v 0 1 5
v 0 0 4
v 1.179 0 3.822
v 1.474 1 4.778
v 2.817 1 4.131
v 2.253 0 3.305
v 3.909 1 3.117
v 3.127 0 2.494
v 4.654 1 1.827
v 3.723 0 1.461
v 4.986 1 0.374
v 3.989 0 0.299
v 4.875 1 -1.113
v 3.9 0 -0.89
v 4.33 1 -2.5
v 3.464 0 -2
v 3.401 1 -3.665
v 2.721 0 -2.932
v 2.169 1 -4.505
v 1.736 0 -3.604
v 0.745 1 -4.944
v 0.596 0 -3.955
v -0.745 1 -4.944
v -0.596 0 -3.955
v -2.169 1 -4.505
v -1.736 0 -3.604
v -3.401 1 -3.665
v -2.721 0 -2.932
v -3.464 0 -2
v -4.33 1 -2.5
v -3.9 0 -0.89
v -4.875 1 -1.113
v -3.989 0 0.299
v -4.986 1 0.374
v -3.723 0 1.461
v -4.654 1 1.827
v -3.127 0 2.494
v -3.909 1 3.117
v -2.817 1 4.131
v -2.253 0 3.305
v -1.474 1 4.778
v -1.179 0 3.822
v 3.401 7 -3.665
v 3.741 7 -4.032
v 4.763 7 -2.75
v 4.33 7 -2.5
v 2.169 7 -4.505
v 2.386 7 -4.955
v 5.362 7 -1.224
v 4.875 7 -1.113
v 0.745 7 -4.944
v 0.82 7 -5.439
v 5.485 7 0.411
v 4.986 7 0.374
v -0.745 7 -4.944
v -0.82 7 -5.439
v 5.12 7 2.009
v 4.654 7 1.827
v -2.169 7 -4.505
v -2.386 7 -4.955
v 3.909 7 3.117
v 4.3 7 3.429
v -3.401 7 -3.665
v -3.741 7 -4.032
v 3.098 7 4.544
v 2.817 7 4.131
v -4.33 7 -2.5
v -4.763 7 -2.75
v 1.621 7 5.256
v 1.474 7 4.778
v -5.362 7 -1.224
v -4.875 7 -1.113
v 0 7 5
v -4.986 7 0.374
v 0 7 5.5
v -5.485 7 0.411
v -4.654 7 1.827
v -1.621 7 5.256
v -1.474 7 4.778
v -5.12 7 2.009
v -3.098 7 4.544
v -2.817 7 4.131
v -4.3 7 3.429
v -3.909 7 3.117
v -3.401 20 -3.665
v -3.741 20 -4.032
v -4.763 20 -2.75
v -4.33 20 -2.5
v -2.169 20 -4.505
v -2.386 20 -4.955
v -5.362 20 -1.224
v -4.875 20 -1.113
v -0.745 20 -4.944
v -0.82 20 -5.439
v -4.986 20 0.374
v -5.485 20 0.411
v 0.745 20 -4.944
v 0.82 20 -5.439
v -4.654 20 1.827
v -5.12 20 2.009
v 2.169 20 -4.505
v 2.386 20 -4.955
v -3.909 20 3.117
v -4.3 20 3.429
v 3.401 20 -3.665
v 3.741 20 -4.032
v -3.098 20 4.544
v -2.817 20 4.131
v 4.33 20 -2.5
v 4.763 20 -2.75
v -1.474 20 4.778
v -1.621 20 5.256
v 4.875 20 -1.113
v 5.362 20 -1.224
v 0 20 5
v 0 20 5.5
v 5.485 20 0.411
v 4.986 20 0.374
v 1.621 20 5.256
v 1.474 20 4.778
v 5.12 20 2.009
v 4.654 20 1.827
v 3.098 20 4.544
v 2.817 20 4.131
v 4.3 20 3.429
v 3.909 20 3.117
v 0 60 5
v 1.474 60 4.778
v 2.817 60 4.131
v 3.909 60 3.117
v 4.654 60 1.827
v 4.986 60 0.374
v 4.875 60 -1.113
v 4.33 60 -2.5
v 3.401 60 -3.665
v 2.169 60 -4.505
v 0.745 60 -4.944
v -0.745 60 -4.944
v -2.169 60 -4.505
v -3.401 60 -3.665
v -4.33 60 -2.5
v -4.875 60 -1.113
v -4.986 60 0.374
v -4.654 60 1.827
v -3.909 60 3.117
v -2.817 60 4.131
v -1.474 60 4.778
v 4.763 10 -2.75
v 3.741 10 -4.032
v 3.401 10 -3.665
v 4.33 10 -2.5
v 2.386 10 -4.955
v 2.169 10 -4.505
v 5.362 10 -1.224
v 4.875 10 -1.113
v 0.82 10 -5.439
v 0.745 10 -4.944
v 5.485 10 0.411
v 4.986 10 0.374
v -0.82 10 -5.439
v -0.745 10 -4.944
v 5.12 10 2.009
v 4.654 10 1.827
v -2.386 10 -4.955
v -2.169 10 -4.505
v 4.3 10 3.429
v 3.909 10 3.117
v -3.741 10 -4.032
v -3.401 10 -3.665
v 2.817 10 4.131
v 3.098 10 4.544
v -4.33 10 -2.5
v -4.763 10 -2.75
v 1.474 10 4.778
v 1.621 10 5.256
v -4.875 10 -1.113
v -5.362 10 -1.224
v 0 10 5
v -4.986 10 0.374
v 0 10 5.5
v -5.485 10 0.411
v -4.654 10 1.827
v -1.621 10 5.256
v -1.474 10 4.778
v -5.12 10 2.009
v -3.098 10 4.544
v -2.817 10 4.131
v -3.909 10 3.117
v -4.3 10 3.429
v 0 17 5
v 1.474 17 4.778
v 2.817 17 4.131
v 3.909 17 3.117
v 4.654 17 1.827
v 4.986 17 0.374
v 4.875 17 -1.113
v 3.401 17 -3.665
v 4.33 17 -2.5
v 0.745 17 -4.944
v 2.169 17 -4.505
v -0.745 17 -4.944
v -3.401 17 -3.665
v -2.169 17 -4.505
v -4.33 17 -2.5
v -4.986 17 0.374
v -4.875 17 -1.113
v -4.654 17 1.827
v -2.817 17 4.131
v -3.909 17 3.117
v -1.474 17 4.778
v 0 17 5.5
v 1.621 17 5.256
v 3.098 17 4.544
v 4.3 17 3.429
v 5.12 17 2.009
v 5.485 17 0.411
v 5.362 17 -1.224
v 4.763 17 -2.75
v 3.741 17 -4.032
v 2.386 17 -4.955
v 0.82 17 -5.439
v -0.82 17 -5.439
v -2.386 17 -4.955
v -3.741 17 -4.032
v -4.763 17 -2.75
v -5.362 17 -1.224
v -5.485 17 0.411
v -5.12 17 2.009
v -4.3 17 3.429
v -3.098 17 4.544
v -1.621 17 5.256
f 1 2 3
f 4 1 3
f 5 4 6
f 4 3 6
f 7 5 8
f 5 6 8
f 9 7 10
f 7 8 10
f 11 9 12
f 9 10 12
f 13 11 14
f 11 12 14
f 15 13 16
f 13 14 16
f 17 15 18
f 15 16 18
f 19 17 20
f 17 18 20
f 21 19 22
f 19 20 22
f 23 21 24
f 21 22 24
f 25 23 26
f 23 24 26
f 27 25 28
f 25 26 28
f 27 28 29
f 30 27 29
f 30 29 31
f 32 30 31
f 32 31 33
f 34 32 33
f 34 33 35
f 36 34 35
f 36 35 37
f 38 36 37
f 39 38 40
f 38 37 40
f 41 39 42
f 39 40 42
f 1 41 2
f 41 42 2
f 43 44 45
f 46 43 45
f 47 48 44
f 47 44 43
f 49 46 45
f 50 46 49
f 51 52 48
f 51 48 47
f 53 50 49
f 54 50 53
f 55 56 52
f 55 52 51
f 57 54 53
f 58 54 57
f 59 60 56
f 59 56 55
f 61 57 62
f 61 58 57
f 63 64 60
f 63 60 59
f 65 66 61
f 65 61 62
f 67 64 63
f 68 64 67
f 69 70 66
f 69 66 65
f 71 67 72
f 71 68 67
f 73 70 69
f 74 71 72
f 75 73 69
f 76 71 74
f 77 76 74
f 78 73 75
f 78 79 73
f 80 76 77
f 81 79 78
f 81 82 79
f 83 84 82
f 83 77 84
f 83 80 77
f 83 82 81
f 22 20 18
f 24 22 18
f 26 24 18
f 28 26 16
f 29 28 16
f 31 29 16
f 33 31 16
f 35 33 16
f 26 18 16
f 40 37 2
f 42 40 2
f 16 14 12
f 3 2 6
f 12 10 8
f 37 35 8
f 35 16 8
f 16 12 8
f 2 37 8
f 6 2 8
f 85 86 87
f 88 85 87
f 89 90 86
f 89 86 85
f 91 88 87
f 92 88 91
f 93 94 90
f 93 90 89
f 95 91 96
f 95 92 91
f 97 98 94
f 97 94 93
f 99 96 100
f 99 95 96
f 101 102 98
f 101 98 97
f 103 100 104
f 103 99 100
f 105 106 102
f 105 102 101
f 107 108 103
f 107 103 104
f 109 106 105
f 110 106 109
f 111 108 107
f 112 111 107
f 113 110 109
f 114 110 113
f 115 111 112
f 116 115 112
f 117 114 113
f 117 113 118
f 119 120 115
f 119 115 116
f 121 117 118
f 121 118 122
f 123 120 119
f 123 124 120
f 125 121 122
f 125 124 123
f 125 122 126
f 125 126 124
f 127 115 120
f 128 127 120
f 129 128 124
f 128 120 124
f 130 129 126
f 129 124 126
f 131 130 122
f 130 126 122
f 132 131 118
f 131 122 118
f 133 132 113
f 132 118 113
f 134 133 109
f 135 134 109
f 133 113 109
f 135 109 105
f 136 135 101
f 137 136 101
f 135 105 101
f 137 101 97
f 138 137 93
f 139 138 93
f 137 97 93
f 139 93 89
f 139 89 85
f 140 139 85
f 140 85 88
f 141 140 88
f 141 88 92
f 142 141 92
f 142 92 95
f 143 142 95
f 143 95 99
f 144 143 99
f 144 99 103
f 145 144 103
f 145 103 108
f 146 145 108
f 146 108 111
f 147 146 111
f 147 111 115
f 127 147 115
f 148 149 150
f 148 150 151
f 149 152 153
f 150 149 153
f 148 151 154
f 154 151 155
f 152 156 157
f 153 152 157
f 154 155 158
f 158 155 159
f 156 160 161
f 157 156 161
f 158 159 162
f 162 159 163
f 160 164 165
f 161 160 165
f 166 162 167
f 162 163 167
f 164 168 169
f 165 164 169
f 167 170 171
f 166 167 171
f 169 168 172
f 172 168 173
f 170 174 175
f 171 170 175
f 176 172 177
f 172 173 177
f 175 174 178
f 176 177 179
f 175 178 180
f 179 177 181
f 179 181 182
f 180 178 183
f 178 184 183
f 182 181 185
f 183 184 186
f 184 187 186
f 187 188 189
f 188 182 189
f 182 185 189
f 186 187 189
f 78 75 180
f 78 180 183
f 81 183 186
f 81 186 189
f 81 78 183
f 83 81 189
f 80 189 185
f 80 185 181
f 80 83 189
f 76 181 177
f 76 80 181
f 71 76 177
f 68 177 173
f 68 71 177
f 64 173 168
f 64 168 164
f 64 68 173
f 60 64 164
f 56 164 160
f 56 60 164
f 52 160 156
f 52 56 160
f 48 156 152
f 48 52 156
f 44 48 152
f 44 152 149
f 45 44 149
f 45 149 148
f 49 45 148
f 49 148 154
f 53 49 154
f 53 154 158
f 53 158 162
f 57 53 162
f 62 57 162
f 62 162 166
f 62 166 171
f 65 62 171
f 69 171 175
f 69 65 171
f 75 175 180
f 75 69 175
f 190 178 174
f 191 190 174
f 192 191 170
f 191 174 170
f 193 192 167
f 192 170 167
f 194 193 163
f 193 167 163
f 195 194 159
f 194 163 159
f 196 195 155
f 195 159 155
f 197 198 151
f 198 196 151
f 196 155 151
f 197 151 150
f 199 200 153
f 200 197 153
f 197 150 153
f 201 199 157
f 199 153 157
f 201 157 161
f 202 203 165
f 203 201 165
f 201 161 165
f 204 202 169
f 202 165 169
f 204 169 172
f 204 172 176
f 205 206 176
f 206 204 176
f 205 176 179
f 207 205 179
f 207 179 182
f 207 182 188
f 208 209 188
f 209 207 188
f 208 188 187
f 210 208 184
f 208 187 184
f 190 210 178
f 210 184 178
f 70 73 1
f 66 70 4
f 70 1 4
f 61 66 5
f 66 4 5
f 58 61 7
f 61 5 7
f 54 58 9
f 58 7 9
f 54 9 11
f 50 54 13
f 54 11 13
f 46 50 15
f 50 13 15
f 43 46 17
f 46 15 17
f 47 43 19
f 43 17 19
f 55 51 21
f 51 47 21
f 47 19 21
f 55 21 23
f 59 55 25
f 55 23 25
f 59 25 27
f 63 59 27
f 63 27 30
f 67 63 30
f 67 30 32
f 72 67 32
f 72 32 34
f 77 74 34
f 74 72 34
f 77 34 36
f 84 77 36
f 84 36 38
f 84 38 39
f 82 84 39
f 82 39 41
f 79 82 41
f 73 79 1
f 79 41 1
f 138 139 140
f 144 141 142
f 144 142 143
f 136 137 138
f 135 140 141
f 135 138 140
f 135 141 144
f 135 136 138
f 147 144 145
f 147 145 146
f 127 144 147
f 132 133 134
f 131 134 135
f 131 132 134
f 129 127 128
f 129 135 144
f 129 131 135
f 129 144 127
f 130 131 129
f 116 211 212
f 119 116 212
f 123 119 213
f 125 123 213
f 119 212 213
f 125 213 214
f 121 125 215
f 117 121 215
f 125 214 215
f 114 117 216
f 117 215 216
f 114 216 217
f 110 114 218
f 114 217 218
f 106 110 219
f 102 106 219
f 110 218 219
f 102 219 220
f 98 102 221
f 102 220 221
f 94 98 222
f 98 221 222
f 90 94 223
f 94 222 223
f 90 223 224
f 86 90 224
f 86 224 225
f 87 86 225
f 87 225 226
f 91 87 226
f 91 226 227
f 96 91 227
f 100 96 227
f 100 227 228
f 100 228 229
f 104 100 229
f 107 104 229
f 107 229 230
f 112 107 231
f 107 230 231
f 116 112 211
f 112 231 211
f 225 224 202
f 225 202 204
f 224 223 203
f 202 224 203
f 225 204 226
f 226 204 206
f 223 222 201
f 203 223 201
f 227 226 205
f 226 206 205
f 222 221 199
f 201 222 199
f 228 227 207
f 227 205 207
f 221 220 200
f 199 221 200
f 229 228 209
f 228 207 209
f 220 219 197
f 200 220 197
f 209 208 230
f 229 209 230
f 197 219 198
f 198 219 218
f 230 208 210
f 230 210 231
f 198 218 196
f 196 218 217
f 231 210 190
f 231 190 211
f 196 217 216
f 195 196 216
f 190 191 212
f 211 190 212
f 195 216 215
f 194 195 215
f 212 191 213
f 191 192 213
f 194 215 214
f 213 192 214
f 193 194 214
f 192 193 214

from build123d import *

# Parameters (mm, degrees)
SKETCH1_R           = 5
BOSS_EXTRUDE1_DEPTH = 60
BOSS_EXTRUDE2_START = -43
SKETCH2_R           = 5.5
BOSS_EXTRUDE2_DEPTH = 3
CHAMFER1_SIZE       = 1
BOSS_EXTRUDE3_START = -7
SKETCH3_R           = 5.5
BOSS_EXTRUDE3_DEPTH = 3


with BuildPart() as part:
    # Sketch1 → Boss-Extrude1 (new body)
    with BuildSketch(Plane(origin=(0, 0, 0), x_dir=(1, 0, 0), z_dir=(0, 1, 0))):
        with Locations(Location((0, 0, 0), (0, 0, 270))):
            Circle(SKETCH1_R)
    extrude(amount=BOSS_EXTRUDE1_DEPTH)

    # Sketch2 → Boss-Extrude2 (add)
    with BuildSketch(Plane(origin=(0, 60, 0), x_dir=(1, 0, 0), z_dir=(0, 1, 0)).offset(BOSS_EXTRUDE2_START)):
        with Locations(Location((0, 0, 0), (0, 0, 270))):
            Circle(SKETCH2_R)
    extrude(amount=BOSS_EXTRUDE2_DEPTH)

    # Chamfer1
    chamfer1_edges = [part.edges().sort_by_distance(p)[0] for p in [
        (0, 0, -5),
    ]]
    chamfer(chamfer1_edges, length=CHAMFER1_SIZE)

    # Sketch3 → Boss-Extrude3 (add)
    with BuildSketch(Plane.XZ.offset(BOSS_EXTRUDE3_START)):
        with Locations(Location((0, 0, 0), (0, 0, 90))):
            Circle(SKETCH3_R)
    extrude(amount=-BOSS_EXTRUDE3_DEPTH)


solid = part.part
